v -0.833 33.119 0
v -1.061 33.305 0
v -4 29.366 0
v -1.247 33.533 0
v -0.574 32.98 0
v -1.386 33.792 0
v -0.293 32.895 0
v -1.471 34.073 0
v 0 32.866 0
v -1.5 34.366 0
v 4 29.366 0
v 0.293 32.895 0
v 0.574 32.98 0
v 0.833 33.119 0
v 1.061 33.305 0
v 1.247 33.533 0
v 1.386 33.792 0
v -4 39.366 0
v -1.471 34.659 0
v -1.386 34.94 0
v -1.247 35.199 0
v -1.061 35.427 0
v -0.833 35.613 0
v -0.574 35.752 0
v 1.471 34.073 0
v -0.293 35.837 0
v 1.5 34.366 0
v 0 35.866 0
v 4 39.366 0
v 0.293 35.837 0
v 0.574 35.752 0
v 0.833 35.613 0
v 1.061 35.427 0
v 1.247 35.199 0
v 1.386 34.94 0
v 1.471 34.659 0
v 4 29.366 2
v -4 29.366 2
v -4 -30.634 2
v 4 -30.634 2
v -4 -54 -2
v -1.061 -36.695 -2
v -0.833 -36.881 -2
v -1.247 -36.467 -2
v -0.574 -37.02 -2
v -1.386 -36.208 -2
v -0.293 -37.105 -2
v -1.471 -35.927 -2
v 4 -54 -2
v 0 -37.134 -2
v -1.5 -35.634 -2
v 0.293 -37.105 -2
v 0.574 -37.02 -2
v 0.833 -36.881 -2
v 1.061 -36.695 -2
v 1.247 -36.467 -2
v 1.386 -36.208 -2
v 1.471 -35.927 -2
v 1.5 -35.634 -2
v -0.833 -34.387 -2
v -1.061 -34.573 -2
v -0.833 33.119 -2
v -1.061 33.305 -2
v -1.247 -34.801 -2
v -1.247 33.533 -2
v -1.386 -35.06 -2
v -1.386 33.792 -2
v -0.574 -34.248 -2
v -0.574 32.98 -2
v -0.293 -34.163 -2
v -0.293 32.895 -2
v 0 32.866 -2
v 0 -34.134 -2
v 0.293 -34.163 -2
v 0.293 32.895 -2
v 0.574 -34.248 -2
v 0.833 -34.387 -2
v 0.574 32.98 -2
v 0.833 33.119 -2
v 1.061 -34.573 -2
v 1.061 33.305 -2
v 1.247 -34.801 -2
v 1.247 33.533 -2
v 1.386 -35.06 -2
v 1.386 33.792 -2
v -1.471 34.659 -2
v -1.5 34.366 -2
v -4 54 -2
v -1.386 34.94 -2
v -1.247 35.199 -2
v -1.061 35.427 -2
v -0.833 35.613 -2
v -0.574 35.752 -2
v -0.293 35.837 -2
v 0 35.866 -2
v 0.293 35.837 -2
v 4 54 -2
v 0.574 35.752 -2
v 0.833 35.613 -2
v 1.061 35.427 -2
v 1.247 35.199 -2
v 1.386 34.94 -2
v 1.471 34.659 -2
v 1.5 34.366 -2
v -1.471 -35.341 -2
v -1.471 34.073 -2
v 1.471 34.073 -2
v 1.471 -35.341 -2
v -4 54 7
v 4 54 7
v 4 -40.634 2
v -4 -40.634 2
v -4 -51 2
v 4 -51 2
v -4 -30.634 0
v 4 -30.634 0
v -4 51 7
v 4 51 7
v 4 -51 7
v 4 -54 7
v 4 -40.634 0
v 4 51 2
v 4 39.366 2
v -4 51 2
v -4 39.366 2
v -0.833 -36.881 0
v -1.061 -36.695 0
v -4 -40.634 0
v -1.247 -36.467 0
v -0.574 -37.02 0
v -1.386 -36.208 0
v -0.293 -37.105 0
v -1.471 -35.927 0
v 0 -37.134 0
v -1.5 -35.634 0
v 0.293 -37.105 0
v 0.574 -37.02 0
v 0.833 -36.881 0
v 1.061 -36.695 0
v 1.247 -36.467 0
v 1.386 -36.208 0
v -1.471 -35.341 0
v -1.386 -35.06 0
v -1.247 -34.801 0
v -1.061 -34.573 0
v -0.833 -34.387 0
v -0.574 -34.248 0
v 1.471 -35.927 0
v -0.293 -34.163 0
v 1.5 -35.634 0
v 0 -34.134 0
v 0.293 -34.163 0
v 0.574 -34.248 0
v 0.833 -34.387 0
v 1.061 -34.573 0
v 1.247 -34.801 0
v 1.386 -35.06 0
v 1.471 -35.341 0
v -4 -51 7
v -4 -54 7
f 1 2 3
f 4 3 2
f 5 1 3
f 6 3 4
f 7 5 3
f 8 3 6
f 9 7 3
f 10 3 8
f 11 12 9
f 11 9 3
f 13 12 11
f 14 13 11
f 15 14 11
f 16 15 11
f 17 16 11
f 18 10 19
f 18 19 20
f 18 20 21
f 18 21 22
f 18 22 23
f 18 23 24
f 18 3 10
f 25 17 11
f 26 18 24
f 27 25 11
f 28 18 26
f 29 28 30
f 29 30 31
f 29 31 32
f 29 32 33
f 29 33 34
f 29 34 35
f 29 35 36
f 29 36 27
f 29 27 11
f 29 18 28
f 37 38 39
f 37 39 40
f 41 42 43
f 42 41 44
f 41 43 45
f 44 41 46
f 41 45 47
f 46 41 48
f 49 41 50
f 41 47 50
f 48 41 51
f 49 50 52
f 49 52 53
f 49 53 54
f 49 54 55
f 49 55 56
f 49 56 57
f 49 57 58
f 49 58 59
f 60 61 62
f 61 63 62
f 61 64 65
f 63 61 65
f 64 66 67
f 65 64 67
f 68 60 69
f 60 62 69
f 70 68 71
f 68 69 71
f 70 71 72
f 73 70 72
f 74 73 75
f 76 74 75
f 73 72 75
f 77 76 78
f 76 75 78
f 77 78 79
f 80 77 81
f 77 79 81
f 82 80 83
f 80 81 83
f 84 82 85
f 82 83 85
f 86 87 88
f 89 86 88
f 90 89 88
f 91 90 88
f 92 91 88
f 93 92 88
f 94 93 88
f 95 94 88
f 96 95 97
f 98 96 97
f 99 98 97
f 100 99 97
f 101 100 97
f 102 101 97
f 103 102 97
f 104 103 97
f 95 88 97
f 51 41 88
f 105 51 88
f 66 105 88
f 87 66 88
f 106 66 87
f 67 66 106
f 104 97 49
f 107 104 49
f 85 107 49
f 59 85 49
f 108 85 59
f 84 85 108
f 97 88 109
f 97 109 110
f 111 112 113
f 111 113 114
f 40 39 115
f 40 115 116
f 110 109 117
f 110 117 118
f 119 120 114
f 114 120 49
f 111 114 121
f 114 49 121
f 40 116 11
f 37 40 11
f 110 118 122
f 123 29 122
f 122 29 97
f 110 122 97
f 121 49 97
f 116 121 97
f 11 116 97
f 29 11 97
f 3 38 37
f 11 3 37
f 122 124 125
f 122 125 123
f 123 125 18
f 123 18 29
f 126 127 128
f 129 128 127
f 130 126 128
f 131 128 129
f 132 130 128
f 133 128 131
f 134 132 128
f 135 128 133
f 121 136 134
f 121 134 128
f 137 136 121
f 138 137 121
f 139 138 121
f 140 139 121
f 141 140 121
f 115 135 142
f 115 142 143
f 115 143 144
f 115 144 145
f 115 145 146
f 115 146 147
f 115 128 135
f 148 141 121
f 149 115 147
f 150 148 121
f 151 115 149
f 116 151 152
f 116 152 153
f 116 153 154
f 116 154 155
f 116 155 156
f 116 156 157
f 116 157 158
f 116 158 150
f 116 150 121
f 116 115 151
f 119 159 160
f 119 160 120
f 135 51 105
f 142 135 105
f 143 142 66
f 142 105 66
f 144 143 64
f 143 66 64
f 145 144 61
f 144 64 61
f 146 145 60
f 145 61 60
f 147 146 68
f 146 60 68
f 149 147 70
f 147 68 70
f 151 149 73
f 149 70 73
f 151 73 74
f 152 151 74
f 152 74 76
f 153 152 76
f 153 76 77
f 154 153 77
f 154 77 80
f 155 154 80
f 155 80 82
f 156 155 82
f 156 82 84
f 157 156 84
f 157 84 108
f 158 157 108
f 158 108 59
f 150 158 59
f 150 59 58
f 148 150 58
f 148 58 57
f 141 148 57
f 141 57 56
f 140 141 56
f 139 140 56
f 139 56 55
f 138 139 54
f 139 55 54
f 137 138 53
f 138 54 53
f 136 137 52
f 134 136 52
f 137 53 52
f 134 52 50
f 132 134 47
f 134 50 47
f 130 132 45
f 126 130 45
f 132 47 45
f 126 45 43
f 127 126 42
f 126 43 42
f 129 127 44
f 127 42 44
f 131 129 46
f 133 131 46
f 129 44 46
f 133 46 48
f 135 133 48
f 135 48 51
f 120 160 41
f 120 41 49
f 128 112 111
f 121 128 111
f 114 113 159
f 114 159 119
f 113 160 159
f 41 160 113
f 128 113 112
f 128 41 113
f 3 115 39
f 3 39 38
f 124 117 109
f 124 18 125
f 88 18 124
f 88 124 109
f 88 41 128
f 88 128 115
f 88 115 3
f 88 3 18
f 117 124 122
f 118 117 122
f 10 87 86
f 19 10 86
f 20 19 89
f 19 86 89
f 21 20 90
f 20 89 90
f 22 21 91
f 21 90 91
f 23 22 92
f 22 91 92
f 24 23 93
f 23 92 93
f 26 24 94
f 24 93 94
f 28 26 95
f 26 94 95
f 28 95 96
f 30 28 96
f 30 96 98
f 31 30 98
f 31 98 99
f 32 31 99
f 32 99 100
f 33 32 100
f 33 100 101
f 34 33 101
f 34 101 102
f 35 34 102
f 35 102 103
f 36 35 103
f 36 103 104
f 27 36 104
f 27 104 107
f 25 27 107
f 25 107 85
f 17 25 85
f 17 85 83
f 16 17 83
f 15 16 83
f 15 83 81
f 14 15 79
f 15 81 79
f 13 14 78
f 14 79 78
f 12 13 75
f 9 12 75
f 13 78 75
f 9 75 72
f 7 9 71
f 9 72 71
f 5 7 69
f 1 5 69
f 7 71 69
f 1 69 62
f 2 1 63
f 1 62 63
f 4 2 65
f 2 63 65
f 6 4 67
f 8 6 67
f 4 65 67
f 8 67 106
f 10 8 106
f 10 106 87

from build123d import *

# Parameters (mm, degrees)
F0_W     = 8
F0_H     = 108
F1_DEPTH = 2
F2_W     = 8
F2_H     = 3
F3_DEPTH = 5
F5_D     = 3
F6_W     = 8
F6_H     = 10
F6_R     = 1.5
F7_DEPTH = 2


with BuildPart() as f1:
    # F0 (on Top) → F1 (new body, symmetric)
    with BuildSketch(Plane.XY):
        Rectangle(F0_W, F0_H)
    extrude(amount=F1_DEPTH, both=True)

    # F2 (on face) → F3 (join)
    with BuildSketch(Plane.XY.offset(2)):
        with Locations((0, 52.5)):
            Rectangle(F2_W, F2_H)
        with Locations((0, -52.5)):
            Rectangle(F2_W, F2_H)
    extrude(amount=F3_DEPTH)

    # F5 (through all)
    with Locations(Plane.XY.offset(2)):
        with Locations((0, 34.365942), (0, -35.634058)):
            Hole(F5_D / 2)

    # F6 (on face) → F7 (cut)
    with BuildSketch(Plane.XY.offset(2)):
        with Locations((0, -35.634058)):
            Rectangle(F6_W, F6_H)
        with Locations((0, -35.634058)):
            Circle(F6_R, mode=Mode.SUBTRACT)
        with Locations((0, 34.365942)):
            Rectangle(F6_W, F6_H)
        with Locations((0, 34.365942)):
            Circle(F6_R, mode=Mode.SUBTRACT)
    extrude(amount=-F7_DEPTH, mode=Mode.SUBTRACT)


solid = f1.part
